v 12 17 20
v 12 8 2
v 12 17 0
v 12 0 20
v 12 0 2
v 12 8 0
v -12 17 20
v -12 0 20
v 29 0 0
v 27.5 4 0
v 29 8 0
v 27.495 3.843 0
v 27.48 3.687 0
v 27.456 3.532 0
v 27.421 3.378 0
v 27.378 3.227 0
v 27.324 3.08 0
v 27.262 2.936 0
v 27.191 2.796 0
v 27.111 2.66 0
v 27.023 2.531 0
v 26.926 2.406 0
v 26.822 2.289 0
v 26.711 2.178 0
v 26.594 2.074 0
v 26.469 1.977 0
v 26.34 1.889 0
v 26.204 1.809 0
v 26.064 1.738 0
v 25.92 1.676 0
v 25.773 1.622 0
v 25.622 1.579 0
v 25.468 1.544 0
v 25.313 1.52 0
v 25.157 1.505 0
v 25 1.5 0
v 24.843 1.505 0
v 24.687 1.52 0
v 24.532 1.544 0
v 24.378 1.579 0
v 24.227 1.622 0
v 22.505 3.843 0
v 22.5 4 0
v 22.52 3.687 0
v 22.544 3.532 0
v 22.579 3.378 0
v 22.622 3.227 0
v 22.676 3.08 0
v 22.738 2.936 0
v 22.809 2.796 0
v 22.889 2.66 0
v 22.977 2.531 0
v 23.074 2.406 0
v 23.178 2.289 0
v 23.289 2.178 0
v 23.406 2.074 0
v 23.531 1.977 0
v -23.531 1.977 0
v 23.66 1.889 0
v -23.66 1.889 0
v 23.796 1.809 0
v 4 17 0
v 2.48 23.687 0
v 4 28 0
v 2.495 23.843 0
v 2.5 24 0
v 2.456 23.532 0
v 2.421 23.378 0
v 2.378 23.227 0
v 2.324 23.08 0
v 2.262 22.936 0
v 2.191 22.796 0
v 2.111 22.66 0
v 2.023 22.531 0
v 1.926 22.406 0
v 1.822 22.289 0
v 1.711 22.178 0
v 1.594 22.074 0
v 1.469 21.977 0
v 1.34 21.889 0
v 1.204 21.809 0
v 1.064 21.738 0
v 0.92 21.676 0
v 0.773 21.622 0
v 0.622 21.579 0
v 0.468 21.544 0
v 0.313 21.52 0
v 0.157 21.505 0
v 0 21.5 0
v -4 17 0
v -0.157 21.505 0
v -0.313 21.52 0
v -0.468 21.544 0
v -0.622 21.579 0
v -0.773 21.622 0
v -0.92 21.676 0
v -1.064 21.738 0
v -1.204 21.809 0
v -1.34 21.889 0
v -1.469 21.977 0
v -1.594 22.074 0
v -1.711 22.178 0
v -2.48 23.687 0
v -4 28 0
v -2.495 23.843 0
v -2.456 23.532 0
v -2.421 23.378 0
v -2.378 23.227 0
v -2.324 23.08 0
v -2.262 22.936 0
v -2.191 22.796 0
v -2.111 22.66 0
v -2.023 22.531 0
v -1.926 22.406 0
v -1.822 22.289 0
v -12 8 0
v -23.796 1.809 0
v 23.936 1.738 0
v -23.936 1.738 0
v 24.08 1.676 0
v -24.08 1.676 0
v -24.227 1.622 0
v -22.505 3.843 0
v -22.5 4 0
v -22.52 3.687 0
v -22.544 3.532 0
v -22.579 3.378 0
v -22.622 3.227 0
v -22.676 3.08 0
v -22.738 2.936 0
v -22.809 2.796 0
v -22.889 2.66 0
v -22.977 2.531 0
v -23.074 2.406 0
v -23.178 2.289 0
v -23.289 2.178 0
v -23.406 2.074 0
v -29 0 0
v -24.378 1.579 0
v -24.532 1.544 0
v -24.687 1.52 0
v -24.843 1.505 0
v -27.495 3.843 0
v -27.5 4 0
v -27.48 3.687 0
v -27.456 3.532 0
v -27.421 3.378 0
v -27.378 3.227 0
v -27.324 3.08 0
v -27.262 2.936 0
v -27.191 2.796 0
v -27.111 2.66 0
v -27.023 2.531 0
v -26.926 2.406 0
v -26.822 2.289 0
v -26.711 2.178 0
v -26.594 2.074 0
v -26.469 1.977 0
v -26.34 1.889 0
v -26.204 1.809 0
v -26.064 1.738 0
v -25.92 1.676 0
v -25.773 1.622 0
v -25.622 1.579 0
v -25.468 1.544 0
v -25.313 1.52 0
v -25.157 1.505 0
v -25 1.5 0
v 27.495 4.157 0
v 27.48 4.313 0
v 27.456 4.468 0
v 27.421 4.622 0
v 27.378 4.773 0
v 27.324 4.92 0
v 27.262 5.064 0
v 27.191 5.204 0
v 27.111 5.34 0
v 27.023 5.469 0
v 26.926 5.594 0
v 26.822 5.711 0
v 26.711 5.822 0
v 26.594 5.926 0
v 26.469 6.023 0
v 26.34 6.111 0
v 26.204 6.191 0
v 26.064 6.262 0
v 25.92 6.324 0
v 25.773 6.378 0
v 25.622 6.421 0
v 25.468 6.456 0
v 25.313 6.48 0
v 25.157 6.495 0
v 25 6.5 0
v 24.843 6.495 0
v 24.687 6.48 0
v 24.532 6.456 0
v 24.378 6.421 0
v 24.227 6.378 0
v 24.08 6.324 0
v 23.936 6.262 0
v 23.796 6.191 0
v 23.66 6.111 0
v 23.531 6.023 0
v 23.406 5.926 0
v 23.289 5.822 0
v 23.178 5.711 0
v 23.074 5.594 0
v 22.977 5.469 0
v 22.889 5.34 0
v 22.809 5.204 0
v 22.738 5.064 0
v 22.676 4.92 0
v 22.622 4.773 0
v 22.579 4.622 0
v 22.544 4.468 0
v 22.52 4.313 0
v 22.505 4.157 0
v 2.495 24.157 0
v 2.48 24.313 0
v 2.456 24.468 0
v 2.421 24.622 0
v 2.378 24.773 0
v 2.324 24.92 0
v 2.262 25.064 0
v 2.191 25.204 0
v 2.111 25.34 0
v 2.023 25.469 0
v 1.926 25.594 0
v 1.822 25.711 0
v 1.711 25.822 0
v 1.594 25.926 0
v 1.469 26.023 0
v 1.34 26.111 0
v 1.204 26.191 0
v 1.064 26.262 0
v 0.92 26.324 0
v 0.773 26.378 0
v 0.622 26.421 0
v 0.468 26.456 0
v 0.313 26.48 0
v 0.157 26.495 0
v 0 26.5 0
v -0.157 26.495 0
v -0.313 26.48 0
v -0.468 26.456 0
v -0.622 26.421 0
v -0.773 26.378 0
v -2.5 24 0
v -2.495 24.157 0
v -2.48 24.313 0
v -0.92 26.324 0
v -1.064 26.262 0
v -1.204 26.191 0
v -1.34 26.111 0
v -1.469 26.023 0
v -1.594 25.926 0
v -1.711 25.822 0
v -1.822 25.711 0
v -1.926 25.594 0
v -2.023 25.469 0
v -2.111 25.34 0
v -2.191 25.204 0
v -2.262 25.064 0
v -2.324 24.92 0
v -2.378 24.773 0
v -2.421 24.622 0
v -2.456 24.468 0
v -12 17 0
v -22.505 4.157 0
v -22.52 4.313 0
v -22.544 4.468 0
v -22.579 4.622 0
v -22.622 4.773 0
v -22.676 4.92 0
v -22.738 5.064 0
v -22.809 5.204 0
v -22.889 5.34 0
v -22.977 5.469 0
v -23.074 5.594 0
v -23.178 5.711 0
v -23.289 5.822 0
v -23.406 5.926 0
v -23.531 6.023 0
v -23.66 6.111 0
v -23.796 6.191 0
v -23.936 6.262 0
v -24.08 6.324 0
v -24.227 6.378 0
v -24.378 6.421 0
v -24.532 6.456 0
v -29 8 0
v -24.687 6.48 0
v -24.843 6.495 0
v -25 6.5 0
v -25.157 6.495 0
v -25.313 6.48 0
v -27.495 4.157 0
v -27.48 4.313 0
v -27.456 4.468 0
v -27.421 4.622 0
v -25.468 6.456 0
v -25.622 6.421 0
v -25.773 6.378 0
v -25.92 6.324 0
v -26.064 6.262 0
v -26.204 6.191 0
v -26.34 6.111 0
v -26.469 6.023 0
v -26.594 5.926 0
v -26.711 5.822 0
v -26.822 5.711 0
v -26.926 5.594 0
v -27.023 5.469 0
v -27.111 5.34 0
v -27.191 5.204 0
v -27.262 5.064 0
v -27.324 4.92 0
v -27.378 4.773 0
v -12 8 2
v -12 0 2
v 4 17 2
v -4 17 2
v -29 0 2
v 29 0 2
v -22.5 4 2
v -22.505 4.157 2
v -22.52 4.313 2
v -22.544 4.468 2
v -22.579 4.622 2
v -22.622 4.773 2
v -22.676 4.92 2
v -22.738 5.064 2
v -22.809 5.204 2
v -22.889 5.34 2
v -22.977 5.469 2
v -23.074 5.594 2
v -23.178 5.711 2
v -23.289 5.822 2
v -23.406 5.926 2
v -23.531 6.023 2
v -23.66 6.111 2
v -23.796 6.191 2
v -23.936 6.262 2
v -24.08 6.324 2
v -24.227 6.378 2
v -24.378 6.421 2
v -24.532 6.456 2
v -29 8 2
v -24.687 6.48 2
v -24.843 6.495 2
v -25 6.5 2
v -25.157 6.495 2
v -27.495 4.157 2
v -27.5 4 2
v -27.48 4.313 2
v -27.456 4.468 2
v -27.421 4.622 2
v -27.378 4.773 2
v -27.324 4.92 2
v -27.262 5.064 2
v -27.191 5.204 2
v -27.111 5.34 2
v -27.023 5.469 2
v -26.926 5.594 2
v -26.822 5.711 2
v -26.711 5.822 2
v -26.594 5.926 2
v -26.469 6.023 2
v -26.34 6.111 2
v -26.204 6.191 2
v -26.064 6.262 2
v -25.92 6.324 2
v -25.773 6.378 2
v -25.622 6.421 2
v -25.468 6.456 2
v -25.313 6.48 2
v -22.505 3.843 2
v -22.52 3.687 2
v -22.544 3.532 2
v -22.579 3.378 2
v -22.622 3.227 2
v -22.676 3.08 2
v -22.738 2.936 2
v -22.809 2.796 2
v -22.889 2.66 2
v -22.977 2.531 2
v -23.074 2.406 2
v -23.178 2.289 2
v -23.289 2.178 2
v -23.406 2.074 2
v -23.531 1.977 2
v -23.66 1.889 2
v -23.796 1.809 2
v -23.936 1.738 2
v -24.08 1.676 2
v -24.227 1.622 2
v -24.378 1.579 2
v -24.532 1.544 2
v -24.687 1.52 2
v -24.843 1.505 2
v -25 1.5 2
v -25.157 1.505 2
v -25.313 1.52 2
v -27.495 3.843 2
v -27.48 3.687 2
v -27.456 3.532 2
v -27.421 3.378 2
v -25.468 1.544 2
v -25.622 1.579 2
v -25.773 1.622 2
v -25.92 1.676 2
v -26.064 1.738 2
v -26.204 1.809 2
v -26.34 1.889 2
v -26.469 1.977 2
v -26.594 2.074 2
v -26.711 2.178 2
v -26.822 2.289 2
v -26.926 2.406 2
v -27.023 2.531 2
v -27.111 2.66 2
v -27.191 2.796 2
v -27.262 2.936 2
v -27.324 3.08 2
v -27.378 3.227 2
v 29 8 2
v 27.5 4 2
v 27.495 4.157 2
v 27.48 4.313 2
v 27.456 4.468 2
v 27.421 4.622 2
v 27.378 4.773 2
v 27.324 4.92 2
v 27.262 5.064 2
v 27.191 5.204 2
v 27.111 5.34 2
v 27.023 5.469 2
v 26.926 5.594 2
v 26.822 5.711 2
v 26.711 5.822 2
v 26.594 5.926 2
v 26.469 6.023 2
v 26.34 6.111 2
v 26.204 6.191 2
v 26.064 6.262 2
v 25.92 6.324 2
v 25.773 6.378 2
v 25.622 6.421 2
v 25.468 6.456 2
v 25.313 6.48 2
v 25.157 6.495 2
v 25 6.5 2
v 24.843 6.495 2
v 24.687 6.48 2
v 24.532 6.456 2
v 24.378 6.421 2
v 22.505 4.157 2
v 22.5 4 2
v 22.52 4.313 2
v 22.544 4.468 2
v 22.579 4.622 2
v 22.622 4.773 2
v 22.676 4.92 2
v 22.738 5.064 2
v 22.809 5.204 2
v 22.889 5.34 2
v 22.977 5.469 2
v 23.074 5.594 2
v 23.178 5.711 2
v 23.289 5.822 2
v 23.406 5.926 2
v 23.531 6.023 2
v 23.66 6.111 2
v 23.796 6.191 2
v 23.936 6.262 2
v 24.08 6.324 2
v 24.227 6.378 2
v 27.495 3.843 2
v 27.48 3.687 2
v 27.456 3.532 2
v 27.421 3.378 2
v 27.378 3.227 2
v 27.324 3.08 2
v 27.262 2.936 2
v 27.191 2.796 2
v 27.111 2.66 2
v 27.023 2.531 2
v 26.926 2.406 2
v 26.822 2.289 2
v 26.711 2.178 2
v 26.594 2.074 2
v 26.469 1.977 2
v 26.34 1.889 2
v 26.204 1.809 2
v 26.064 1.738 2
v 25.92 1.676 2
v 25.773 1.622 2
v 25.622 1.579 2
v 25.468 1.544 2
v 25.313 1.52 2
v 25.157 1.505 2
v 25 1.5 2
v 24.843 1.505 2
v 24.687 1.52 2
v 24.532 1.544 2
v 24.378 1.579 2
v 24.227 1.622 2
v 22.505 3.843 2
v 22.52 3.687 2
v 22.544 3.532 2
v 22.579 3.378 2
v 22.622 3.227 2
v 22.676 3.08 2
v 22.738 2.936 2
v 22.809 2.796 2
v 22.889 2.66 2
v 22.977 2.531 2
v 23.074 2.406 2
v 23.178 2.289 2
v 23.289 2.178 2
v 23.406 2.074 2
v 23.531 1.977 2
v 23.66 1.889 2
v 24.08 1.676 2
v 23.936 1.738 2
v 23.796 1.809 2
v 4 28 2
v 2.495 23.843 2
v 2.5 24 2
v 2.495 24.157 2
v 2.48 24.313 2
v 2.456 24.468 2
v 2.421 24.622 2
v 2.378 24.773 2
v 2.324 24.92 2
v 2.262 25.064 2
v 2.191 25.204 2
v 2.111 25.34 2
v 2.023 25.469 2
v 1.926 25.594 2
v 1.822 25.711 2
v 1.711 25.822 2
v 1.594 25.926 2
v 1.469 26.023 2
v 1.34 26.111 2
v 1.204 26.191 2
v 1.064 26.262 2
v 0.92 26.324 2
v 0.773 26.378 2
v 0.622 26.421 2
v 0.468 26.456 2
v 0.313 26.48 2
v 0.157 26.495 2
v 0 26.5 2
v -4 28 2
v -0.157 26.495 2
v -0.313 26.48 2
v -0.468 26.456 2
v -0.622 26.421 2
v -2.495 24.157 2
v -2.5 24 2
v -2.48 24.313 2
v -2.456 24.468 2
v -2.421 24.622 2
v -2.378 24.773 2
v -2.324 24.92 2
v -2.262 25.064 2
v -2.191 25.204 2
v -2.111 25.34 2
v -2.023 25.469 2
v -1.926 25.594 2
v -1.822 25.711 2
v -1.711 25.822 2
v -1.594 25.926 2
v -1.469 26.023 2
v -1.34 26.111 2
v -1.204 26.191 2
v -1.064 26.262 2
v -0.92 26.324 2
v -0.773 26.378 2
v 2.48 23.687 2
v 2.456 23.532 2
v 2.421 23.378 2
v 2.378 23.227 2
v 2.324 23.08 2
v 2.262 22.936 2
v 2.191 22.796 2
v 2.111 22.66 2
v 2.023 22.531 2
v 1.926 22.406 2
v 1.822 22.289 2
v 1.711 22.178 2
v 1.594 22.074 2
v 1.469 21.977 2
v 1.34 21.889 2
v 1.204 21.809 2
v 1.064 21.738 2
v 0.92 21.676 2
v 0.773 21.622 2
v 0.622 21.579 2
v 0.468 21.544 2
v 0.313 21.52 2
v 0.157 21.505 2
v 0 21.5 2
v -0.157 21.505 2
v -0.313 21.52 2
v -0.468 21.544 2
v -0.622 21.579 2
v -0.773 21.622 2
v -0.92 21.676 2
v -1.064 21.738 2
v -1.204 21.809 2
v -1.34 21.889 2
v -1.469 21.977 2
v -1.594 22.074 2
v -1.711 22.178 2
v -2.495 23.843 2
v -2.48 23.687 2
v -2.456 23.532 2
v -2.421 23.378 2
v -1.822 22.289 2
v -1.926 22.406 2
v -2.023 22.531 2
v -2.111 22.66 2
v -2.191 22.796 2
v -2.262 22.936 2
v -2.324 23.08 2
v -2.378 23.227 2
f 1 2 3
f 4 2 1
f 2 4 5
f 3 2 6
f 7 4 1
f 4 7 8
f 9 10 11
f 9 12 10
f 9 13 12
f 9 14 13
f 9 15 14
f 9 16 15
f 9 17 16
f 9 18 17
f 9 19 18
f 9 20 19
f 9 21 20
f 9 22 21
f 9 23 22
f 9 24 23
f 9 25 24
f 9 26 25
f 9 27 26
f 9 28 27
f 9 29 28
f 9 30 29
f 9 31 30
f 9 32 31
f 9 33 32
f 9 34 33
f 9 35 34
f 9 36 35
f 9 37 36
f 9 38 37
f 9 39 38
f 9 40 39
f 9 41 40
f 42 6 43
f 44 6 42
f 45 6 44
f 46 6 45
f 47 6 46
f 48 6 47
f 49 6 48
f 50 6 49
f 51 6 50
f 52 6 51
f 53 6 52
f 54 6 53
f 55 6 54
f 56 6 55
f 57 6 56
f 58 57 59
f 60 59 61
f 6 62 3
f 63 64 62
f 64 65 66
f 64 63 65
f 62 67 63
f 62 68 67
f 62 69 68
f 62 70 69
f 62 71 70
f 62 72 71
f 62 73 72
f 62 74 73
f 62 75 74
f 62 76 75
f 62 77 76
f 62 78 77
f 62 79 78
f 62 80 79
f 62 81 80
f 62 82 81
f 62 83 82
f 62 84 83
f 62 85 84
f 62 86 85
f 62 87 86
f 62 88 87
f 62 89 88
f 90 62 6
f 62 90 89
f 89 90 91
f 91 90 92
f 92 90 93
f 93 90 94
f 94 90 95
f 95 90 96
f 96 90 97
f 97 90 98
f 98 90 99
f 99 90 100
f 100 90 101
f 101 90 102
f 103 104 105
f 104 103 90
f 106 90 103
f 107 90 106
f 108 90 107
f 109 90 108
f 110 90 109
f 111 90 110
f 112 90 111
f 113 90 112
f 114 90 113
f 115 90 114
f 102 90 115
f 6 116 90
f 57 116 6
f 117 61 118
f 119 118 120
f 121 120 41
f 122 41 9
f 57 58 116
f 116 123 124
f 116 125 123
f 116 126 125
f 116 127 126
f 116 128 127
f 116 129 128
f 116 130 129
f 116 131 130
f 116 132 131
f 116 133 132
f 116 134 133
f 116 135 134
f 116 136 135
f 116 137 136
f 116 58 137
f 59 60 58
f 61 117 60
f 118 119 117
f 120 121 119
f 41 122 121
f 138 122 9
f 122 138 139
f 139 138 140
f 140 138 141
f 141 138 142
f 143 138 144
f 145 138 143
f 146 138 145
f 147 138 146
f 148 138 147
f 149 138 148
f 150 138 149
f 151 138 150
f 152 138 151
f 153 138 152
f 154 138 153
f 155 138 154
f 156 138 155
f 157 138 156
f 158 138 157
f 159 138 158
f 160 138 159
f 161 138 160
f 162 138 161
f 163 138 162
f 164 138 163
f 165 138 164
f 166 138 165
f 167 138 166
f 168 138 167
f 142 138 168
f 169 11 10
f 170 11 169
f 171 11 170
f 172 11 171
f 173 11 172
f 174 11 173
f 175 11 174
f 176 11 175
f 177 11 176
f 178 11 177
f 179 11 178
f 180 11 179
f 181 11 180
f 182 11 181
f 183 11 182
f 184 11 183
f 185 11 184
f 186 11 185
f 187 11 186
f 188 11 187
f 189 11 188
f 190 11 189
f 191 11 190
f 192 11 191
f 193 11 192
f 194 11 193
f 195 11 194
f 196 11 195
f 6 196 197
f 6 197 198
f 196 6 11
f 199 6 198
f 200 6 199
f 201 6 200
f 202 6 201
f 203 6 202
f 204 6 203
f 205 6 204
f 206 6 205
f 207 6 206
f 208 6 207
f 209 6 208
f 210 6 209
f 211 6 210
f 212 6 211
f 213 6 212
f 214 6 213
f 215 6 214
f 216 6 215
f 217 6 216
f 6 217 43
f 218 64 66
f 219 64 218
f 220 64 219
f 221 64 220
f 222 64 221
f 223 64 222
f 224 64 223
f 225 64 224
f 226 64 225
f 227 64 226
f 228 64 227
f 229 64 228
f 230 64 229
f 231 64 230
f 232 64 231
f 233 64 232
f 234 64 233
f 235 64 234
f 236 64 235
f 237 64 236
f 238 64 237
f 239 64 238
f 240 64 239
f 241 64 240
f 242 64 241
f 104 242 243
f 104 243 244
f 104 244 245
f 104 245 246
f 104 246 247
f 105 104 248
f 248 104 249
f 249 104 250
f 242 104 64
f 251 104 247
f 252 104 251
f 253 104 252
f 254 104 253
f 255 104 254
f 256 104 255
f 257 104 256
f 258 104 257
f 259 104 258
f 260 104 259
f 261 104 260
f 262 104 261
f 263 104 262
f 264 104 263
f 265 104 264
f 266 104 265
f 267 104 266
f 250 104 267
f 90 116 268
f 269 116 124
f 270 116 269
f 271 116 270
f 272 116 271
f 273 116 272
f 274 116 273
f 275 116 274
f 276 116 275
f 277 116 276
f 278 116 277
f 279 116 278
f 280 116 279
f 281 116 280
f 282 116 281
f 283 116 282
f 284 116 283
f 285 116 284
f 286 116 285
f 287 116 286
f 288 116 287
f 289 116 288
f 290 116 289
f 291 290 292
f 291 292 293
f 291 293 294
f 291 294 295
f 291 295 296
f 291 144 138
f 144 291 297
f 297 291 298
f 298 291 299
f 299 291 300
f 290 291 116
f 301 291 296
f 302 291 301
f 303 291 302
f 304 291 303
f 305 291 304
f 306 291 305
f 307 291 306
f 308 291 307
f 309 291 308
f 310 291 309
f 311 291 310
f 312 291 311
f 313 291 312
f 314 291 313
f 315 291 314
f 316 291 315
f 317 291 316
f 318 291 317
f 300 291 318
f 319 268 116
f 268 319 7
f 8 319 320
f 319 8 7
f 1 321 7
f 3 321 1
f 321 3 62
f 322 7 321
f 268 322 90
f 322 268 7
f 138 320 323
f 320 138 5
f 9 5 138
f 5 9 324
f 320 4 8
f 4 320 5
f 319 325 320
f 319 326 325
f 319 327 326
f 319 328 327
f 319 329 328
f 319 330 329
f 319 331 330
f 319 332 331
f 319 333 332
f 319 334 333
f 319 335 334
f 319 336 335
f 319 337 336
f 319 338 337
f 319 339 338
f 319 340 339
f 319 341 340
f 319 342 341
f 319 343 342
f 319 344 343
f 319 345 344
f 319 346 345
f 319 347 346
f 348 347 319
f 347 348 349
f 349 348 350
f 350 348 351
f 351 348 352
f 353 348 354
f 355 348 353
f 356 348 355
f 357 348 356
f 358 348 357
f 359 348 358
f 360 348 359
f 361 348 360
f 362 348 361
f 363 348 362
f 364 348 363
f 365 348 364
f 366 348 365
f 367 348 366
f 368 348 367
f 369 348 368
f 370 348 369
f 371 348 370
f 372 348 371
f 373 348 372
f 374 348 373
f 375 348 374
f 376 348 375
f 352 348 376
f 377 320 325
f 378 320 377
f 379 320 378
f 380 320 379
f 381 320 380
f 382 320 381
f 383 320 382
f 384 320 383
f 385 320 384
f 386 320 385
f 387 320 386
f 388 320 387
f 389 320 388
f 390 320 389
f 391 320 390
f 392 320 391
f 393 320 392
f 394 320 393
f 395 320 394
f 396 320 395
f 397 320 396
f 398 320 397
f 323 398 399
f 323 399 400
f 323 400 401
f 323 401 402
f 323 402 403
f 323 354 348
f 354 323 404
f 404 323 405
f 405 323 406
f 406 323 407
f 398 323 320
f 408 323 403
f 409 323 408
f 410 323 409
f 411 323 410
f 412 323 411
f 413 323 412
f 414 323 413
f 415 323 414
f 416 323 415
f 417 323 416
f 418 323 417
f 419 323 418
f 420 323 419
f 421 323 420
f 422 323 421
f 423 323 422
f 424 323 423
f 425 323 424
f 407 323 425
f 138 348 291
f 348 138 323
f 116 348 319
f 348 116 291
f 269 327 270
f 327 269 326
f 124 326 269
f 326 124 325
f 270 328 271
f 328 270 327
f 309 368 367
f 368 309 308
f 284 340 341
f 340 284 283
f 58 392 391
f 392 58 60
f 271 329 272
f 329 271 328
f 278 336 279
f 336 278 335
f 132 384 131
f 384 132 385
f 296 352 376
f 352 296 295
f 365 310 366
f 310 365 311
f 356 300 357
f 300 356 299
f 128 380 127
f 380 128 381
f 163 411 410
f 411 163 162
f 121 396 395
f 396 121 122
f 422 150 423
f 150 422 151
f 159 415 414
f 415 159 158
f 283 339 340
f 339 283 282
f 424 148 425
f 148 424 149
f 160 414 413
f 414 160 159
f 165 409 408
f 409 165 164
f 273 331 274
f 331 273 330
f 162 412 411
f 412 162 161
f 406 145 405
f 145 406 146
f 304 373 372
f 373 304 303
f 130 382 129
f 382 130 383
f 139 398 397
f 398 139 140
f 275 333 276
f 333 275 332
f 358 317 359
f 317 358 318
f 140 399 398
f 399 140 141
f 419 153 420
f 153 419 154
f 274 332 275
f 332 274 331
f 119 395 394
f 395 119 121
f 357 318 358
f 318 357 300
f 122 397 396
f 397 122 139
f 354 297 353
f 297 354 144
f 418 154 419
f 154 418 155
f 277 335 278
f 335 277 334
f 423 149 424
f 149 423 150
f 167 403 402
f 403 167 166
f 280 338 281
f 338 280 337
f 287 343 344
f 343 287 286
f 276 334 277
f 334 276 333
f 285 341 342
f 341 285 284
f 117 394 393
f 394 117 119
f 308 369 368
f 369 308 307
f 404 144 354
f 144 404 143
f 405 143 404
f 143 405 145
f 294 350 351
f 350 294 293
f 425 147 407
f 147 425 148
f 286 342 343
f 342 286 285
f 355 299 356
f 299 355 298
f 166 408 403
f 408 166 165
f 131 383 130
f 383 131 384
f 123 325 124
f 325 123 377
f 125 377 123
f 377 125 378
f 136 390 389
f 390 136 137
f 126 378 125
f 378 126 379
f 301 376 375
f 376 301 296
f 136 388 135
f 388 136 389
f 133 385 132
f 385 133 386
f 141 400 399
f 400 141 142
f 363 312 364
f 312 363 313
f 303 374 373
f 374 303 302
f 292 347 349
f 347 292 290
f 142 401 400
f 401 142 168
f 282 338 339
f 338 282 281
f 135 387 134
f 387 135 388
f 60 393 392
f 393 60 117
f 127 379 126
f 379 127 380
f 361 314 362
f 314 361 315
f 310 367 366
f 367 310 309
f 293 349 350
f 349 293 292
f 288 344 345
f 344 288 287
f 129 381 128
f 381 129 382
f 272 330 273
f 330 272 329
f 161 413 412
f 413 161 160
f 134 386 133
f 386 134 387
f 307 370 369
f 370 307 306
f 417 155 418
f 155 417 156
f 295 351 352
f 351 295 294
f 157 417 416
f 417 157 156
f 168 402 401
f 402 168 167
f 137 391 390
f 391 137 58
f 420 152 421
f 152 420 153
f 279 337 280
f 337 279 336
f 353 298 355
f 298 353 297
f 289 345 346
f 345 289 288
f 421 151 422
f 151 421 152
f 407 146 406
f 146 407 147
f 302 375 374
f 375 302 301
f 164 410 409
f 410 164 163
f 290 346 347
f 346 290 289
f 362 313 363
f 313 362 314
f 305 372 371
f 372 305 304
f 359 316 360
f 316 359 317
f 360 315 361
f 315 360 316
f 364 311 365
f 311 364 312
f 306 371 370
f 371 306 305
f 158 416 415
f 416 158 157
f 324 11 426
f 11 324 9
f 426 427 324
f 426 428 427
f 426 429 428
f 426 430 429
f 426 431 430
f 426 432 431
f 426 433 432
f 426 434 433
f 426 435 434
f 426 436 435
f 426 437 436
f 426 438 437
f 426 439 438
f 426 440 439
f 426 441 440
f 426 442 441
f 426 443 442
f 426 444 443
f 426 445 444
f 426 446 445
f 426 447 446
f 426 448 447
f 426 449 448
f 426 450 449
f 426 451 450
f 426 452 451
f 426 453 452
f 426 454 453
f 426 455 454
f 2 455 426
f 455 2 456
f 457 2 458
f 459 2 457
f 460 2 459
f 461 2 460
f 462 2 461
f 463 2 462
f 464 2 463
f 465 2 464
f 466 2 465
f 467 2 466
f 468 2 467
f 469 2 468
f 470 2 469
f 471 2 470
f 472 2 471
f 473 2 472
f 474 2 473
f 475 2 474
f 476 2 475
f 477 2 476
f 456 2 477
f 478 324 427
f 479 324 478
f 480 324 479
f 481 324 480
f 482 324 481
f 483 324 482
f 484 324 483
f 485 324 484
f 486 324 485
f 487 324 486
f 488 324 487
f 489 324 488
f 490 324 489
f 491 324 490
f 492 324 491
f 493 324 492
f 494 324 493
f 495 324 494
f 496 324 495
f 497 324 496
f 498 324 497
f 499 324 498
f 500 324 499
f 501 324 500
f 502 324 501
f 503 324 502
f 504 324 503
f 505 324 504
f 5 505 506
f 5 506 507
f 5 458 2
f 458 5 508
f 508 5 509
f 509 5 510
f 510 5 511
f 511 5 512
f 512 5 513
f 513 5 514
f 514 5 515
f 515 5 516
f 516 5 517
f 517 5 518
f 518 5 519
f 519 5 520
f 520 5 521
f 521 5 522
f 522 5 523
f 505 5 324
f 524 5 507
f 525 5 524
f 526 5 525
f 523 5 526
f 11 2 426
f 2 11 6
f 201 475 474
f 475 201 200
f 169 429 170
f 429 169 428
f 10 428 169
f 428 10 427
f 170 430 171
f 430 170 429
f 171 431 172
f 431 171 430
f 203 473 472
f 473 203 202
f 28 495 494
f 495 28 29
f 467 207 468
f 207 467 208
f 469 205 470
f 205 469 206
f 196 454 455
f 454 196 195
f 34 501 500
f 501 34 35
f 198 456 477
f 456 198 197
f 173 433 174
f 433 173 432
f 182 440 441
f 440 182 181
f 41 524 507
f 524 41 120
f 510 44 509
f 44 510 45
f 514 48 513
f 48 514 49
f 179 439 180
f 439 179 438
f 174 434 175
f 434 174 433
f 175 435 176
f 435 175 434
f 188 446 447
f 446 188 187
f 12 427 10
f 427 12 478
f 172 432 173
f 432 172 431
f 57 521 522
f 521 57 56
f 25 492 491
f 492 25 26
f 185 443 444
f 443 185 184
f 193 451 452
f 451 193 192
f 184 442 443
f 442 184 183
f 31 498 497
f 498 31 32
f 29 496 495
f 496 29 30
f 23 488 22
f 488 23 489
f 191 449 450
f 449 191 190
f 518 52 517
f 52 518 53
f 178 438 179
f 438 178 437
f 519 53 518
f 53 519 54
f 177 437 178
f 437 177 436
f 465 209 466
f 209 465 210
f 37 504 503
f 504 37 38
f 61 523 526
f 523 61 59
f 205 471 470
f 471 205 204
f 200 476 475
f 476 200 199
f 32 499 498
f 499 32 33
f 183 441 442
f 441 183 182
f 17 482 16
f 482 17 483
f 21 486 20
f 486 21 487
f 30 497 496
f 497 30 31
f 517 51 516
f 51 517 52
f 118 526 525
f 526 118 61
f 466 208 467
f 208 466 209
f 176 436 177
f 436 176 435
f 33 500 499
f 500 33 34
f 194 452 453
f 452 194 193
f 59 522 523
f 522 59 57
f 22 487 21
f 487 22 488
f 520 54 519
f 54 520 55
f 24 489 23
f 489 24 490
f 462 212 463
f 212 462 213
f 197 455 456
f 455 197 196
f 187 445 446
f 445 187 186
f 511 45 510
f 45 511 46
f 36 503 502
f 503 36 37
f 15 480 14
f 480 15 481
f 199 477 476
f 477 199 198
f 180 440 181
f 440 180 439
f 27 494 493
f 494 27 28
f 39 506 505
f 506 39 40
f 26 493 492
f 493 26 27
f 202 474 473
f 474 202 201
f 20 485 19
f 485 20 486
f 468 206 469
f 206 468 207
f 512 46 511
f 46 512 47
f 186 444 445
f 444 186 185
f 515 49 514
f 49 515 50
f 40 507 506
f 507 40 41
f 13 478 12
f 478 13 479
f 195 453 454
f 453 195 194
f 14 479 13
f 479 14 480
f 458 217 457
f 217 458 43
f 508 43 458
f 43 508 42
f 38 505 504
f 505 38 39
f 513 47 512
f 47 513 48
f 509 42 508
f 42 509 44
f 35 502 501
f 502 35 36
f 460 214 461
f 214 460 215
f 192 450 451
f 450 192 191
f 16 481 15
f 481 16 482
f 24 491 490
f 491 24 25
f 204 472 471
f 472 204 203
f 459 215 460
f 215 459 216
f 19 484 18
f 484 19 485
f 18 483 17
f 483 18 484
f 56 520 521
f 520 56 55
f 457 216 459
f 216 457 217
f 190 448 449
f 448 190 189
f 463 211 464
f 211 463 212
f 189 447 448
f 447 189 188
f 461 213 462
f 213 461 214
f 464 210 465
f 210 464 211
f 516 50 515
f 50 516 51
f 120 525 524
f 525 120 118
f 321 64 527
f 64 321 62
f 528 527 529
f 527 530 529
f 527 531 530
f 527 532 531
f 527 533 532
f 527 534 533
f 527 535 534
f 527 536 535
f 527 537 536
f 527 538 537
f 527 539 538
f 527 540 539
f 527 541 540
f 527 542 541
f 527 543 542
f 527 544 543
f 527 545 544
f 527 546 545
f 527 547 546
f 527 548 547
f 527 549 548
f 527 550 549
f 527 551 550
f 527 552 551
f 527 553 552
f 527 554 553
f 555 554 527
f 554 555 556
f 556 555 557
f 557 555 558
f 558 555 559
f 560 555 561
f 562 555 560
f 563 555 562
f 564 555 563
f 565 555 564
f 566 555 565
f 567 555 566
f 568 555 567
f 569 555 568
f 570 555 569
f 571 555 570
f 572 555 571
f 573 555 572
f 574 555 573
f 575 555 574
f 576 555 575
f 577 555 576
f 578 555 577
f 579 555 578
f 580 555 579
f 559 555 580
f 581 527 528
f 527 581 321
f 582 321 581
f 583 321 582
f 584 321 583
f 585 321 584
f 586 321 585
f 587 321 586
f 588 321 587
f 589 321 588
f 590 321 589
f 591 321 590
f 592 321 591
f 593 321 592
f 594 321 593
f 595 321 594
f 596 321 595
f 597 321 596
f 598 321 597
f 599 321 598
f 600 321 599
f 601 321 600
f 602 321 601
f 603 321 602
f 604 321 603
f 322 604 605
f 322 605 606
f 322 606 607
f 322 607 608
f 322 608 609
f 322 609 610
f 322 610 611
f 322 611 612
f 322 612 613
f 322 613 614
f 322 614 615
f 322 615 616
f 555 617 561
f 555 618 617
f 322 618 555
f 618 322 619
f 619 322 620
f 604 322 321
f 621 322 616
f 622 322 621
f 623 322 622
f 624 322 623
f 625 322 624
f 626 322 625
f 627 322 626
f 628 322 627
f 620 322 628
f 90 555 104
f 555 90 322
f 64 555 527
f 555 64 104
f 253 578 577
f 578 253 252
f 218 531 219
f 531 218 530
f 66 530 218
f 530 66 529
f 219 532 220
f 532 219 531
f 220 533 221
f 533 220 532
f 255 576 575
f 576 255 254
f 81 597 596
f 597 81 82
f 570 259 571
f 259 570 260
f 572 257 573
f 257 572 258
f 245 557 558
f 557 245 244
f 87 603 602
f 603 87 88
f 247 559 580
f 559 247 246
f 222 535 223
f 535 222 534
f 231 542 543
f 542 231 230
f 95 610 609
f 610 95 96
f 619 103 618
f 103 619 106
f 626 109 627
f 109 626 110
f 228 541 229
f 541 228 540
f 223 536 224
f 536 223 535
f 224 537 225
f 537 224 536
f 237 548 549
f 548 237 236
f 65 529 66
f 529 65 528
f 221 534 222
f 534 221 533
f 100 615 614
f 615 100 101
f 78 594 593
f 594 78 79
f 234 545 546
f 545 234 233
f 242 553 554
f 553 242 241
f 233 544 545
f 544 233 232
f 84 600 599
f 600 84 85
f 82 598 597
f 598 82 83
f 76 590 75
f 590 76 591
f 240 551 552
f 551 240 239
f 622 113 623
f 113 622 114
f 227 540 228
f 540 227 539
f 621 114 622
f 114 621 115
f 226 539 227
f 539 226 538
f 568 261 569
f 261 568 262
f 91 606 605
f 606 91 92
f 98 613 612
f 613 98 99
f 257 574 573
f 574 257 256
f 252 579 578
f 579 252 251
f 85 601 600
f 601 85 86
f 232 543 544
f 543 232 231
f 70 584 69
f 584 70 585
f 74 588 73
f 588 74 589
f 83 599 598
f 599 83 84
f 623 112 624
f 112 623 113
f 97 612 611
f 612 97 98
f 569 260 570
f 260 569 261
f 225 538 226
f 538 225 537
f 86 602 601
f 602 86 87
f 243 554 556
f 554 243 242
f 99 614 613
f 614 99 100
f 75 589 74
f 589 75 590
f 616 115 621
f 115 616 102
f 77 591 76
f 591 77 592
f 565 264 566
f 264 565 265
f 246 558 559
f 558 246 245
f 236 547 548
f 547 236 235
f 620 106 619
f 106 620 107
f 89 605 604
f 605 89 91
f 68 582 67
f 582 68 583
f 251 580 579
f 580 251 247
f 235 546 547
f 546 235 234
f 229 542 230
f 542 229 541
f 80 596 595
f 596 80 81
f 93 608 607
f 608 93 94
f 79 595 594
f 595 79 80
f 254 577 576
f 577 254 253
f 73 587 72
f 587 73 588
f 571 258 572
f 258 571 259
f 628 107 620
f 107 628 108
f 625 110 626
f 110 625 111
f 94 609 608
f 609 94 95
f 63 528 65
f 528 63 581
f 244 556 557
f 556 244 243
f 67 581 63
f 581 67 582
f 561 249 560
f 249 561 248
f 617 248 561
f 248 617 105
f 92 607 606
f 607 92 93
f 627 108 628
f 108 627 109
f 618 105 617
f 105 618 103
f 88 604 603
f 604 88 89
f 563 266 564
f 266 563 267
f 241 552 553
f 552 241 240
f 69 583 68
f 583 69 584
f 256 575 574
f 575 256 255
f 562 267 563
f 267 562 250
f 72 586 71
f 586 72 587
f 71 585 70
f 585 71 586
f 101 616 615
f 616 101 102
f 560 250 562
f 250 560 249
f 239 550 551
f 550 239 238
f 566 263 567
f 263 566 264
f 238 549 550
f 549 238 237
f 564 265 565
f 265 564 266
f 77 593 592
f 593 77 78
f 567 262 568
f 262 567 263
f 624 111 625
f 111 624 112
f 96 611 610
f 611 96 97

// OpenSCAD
//box_column();
//gear_shim();
motor_fix();

/**
 * Стойки для коробки: 
 * высота=6мм
 * внутреннее отверстие для винта=4мм 
 * (+зазор 1мм для погрешлости печати)
 */
module box_column() {
  difference(){
    cylinder(h=6, r=3.5, $fn=100);
    translate([0,0,-1])
      cylinder(h=8, r=2.5, $fn=100);
  }
}

/**
 * Прокладка для шестеренки:
 * высота=1мм
 * 
 */
module gear_shim() {
  difference(){
    cylinder(h=1, r=4, $fn=100);
    translate([0,0,-1])
      cylinder(h=3, r=1.2, $fn=100);
  }
}

module motor_fix() {
  // блок для мотора
  difference() {
    translate([-12, 0, 0]) cube([24, 17, 20]);

    translate([-10, 0, -1])
      linear_extrude(height=22)
        import(file="motor_face.dxf");
  }

  // крепления
  difference() {
    translate([-18-11, 0, 0]) cube([18, 8, 2]);
    
    // в отверстие 5мм после печати (на Билдере) влезает
    // винт 4мм
    translate([-25, 4, -1]) cylinder(h=4, r=2.5, $fn=100);
  }

  difference() {
    translate([11, 0, 0]) cube([18, 8, 2]);
    
    // в отверстие 5мм после печати (на Билдере) влезает
    // винт 4мм
    translate([25, 4, -1]) cylinder(h=4, r=2.5, $fn=100);
  }

  difference() {
    translate([-4, 16, 0]) cube([8, 12, 2]);
    
    // в отверстие 5мм после печати (на Билдере) влезает
    // винт 4мм
    translate([0, 24, -1]) cylinder(h=4, r=2.5, $fn=100);
  }
}
